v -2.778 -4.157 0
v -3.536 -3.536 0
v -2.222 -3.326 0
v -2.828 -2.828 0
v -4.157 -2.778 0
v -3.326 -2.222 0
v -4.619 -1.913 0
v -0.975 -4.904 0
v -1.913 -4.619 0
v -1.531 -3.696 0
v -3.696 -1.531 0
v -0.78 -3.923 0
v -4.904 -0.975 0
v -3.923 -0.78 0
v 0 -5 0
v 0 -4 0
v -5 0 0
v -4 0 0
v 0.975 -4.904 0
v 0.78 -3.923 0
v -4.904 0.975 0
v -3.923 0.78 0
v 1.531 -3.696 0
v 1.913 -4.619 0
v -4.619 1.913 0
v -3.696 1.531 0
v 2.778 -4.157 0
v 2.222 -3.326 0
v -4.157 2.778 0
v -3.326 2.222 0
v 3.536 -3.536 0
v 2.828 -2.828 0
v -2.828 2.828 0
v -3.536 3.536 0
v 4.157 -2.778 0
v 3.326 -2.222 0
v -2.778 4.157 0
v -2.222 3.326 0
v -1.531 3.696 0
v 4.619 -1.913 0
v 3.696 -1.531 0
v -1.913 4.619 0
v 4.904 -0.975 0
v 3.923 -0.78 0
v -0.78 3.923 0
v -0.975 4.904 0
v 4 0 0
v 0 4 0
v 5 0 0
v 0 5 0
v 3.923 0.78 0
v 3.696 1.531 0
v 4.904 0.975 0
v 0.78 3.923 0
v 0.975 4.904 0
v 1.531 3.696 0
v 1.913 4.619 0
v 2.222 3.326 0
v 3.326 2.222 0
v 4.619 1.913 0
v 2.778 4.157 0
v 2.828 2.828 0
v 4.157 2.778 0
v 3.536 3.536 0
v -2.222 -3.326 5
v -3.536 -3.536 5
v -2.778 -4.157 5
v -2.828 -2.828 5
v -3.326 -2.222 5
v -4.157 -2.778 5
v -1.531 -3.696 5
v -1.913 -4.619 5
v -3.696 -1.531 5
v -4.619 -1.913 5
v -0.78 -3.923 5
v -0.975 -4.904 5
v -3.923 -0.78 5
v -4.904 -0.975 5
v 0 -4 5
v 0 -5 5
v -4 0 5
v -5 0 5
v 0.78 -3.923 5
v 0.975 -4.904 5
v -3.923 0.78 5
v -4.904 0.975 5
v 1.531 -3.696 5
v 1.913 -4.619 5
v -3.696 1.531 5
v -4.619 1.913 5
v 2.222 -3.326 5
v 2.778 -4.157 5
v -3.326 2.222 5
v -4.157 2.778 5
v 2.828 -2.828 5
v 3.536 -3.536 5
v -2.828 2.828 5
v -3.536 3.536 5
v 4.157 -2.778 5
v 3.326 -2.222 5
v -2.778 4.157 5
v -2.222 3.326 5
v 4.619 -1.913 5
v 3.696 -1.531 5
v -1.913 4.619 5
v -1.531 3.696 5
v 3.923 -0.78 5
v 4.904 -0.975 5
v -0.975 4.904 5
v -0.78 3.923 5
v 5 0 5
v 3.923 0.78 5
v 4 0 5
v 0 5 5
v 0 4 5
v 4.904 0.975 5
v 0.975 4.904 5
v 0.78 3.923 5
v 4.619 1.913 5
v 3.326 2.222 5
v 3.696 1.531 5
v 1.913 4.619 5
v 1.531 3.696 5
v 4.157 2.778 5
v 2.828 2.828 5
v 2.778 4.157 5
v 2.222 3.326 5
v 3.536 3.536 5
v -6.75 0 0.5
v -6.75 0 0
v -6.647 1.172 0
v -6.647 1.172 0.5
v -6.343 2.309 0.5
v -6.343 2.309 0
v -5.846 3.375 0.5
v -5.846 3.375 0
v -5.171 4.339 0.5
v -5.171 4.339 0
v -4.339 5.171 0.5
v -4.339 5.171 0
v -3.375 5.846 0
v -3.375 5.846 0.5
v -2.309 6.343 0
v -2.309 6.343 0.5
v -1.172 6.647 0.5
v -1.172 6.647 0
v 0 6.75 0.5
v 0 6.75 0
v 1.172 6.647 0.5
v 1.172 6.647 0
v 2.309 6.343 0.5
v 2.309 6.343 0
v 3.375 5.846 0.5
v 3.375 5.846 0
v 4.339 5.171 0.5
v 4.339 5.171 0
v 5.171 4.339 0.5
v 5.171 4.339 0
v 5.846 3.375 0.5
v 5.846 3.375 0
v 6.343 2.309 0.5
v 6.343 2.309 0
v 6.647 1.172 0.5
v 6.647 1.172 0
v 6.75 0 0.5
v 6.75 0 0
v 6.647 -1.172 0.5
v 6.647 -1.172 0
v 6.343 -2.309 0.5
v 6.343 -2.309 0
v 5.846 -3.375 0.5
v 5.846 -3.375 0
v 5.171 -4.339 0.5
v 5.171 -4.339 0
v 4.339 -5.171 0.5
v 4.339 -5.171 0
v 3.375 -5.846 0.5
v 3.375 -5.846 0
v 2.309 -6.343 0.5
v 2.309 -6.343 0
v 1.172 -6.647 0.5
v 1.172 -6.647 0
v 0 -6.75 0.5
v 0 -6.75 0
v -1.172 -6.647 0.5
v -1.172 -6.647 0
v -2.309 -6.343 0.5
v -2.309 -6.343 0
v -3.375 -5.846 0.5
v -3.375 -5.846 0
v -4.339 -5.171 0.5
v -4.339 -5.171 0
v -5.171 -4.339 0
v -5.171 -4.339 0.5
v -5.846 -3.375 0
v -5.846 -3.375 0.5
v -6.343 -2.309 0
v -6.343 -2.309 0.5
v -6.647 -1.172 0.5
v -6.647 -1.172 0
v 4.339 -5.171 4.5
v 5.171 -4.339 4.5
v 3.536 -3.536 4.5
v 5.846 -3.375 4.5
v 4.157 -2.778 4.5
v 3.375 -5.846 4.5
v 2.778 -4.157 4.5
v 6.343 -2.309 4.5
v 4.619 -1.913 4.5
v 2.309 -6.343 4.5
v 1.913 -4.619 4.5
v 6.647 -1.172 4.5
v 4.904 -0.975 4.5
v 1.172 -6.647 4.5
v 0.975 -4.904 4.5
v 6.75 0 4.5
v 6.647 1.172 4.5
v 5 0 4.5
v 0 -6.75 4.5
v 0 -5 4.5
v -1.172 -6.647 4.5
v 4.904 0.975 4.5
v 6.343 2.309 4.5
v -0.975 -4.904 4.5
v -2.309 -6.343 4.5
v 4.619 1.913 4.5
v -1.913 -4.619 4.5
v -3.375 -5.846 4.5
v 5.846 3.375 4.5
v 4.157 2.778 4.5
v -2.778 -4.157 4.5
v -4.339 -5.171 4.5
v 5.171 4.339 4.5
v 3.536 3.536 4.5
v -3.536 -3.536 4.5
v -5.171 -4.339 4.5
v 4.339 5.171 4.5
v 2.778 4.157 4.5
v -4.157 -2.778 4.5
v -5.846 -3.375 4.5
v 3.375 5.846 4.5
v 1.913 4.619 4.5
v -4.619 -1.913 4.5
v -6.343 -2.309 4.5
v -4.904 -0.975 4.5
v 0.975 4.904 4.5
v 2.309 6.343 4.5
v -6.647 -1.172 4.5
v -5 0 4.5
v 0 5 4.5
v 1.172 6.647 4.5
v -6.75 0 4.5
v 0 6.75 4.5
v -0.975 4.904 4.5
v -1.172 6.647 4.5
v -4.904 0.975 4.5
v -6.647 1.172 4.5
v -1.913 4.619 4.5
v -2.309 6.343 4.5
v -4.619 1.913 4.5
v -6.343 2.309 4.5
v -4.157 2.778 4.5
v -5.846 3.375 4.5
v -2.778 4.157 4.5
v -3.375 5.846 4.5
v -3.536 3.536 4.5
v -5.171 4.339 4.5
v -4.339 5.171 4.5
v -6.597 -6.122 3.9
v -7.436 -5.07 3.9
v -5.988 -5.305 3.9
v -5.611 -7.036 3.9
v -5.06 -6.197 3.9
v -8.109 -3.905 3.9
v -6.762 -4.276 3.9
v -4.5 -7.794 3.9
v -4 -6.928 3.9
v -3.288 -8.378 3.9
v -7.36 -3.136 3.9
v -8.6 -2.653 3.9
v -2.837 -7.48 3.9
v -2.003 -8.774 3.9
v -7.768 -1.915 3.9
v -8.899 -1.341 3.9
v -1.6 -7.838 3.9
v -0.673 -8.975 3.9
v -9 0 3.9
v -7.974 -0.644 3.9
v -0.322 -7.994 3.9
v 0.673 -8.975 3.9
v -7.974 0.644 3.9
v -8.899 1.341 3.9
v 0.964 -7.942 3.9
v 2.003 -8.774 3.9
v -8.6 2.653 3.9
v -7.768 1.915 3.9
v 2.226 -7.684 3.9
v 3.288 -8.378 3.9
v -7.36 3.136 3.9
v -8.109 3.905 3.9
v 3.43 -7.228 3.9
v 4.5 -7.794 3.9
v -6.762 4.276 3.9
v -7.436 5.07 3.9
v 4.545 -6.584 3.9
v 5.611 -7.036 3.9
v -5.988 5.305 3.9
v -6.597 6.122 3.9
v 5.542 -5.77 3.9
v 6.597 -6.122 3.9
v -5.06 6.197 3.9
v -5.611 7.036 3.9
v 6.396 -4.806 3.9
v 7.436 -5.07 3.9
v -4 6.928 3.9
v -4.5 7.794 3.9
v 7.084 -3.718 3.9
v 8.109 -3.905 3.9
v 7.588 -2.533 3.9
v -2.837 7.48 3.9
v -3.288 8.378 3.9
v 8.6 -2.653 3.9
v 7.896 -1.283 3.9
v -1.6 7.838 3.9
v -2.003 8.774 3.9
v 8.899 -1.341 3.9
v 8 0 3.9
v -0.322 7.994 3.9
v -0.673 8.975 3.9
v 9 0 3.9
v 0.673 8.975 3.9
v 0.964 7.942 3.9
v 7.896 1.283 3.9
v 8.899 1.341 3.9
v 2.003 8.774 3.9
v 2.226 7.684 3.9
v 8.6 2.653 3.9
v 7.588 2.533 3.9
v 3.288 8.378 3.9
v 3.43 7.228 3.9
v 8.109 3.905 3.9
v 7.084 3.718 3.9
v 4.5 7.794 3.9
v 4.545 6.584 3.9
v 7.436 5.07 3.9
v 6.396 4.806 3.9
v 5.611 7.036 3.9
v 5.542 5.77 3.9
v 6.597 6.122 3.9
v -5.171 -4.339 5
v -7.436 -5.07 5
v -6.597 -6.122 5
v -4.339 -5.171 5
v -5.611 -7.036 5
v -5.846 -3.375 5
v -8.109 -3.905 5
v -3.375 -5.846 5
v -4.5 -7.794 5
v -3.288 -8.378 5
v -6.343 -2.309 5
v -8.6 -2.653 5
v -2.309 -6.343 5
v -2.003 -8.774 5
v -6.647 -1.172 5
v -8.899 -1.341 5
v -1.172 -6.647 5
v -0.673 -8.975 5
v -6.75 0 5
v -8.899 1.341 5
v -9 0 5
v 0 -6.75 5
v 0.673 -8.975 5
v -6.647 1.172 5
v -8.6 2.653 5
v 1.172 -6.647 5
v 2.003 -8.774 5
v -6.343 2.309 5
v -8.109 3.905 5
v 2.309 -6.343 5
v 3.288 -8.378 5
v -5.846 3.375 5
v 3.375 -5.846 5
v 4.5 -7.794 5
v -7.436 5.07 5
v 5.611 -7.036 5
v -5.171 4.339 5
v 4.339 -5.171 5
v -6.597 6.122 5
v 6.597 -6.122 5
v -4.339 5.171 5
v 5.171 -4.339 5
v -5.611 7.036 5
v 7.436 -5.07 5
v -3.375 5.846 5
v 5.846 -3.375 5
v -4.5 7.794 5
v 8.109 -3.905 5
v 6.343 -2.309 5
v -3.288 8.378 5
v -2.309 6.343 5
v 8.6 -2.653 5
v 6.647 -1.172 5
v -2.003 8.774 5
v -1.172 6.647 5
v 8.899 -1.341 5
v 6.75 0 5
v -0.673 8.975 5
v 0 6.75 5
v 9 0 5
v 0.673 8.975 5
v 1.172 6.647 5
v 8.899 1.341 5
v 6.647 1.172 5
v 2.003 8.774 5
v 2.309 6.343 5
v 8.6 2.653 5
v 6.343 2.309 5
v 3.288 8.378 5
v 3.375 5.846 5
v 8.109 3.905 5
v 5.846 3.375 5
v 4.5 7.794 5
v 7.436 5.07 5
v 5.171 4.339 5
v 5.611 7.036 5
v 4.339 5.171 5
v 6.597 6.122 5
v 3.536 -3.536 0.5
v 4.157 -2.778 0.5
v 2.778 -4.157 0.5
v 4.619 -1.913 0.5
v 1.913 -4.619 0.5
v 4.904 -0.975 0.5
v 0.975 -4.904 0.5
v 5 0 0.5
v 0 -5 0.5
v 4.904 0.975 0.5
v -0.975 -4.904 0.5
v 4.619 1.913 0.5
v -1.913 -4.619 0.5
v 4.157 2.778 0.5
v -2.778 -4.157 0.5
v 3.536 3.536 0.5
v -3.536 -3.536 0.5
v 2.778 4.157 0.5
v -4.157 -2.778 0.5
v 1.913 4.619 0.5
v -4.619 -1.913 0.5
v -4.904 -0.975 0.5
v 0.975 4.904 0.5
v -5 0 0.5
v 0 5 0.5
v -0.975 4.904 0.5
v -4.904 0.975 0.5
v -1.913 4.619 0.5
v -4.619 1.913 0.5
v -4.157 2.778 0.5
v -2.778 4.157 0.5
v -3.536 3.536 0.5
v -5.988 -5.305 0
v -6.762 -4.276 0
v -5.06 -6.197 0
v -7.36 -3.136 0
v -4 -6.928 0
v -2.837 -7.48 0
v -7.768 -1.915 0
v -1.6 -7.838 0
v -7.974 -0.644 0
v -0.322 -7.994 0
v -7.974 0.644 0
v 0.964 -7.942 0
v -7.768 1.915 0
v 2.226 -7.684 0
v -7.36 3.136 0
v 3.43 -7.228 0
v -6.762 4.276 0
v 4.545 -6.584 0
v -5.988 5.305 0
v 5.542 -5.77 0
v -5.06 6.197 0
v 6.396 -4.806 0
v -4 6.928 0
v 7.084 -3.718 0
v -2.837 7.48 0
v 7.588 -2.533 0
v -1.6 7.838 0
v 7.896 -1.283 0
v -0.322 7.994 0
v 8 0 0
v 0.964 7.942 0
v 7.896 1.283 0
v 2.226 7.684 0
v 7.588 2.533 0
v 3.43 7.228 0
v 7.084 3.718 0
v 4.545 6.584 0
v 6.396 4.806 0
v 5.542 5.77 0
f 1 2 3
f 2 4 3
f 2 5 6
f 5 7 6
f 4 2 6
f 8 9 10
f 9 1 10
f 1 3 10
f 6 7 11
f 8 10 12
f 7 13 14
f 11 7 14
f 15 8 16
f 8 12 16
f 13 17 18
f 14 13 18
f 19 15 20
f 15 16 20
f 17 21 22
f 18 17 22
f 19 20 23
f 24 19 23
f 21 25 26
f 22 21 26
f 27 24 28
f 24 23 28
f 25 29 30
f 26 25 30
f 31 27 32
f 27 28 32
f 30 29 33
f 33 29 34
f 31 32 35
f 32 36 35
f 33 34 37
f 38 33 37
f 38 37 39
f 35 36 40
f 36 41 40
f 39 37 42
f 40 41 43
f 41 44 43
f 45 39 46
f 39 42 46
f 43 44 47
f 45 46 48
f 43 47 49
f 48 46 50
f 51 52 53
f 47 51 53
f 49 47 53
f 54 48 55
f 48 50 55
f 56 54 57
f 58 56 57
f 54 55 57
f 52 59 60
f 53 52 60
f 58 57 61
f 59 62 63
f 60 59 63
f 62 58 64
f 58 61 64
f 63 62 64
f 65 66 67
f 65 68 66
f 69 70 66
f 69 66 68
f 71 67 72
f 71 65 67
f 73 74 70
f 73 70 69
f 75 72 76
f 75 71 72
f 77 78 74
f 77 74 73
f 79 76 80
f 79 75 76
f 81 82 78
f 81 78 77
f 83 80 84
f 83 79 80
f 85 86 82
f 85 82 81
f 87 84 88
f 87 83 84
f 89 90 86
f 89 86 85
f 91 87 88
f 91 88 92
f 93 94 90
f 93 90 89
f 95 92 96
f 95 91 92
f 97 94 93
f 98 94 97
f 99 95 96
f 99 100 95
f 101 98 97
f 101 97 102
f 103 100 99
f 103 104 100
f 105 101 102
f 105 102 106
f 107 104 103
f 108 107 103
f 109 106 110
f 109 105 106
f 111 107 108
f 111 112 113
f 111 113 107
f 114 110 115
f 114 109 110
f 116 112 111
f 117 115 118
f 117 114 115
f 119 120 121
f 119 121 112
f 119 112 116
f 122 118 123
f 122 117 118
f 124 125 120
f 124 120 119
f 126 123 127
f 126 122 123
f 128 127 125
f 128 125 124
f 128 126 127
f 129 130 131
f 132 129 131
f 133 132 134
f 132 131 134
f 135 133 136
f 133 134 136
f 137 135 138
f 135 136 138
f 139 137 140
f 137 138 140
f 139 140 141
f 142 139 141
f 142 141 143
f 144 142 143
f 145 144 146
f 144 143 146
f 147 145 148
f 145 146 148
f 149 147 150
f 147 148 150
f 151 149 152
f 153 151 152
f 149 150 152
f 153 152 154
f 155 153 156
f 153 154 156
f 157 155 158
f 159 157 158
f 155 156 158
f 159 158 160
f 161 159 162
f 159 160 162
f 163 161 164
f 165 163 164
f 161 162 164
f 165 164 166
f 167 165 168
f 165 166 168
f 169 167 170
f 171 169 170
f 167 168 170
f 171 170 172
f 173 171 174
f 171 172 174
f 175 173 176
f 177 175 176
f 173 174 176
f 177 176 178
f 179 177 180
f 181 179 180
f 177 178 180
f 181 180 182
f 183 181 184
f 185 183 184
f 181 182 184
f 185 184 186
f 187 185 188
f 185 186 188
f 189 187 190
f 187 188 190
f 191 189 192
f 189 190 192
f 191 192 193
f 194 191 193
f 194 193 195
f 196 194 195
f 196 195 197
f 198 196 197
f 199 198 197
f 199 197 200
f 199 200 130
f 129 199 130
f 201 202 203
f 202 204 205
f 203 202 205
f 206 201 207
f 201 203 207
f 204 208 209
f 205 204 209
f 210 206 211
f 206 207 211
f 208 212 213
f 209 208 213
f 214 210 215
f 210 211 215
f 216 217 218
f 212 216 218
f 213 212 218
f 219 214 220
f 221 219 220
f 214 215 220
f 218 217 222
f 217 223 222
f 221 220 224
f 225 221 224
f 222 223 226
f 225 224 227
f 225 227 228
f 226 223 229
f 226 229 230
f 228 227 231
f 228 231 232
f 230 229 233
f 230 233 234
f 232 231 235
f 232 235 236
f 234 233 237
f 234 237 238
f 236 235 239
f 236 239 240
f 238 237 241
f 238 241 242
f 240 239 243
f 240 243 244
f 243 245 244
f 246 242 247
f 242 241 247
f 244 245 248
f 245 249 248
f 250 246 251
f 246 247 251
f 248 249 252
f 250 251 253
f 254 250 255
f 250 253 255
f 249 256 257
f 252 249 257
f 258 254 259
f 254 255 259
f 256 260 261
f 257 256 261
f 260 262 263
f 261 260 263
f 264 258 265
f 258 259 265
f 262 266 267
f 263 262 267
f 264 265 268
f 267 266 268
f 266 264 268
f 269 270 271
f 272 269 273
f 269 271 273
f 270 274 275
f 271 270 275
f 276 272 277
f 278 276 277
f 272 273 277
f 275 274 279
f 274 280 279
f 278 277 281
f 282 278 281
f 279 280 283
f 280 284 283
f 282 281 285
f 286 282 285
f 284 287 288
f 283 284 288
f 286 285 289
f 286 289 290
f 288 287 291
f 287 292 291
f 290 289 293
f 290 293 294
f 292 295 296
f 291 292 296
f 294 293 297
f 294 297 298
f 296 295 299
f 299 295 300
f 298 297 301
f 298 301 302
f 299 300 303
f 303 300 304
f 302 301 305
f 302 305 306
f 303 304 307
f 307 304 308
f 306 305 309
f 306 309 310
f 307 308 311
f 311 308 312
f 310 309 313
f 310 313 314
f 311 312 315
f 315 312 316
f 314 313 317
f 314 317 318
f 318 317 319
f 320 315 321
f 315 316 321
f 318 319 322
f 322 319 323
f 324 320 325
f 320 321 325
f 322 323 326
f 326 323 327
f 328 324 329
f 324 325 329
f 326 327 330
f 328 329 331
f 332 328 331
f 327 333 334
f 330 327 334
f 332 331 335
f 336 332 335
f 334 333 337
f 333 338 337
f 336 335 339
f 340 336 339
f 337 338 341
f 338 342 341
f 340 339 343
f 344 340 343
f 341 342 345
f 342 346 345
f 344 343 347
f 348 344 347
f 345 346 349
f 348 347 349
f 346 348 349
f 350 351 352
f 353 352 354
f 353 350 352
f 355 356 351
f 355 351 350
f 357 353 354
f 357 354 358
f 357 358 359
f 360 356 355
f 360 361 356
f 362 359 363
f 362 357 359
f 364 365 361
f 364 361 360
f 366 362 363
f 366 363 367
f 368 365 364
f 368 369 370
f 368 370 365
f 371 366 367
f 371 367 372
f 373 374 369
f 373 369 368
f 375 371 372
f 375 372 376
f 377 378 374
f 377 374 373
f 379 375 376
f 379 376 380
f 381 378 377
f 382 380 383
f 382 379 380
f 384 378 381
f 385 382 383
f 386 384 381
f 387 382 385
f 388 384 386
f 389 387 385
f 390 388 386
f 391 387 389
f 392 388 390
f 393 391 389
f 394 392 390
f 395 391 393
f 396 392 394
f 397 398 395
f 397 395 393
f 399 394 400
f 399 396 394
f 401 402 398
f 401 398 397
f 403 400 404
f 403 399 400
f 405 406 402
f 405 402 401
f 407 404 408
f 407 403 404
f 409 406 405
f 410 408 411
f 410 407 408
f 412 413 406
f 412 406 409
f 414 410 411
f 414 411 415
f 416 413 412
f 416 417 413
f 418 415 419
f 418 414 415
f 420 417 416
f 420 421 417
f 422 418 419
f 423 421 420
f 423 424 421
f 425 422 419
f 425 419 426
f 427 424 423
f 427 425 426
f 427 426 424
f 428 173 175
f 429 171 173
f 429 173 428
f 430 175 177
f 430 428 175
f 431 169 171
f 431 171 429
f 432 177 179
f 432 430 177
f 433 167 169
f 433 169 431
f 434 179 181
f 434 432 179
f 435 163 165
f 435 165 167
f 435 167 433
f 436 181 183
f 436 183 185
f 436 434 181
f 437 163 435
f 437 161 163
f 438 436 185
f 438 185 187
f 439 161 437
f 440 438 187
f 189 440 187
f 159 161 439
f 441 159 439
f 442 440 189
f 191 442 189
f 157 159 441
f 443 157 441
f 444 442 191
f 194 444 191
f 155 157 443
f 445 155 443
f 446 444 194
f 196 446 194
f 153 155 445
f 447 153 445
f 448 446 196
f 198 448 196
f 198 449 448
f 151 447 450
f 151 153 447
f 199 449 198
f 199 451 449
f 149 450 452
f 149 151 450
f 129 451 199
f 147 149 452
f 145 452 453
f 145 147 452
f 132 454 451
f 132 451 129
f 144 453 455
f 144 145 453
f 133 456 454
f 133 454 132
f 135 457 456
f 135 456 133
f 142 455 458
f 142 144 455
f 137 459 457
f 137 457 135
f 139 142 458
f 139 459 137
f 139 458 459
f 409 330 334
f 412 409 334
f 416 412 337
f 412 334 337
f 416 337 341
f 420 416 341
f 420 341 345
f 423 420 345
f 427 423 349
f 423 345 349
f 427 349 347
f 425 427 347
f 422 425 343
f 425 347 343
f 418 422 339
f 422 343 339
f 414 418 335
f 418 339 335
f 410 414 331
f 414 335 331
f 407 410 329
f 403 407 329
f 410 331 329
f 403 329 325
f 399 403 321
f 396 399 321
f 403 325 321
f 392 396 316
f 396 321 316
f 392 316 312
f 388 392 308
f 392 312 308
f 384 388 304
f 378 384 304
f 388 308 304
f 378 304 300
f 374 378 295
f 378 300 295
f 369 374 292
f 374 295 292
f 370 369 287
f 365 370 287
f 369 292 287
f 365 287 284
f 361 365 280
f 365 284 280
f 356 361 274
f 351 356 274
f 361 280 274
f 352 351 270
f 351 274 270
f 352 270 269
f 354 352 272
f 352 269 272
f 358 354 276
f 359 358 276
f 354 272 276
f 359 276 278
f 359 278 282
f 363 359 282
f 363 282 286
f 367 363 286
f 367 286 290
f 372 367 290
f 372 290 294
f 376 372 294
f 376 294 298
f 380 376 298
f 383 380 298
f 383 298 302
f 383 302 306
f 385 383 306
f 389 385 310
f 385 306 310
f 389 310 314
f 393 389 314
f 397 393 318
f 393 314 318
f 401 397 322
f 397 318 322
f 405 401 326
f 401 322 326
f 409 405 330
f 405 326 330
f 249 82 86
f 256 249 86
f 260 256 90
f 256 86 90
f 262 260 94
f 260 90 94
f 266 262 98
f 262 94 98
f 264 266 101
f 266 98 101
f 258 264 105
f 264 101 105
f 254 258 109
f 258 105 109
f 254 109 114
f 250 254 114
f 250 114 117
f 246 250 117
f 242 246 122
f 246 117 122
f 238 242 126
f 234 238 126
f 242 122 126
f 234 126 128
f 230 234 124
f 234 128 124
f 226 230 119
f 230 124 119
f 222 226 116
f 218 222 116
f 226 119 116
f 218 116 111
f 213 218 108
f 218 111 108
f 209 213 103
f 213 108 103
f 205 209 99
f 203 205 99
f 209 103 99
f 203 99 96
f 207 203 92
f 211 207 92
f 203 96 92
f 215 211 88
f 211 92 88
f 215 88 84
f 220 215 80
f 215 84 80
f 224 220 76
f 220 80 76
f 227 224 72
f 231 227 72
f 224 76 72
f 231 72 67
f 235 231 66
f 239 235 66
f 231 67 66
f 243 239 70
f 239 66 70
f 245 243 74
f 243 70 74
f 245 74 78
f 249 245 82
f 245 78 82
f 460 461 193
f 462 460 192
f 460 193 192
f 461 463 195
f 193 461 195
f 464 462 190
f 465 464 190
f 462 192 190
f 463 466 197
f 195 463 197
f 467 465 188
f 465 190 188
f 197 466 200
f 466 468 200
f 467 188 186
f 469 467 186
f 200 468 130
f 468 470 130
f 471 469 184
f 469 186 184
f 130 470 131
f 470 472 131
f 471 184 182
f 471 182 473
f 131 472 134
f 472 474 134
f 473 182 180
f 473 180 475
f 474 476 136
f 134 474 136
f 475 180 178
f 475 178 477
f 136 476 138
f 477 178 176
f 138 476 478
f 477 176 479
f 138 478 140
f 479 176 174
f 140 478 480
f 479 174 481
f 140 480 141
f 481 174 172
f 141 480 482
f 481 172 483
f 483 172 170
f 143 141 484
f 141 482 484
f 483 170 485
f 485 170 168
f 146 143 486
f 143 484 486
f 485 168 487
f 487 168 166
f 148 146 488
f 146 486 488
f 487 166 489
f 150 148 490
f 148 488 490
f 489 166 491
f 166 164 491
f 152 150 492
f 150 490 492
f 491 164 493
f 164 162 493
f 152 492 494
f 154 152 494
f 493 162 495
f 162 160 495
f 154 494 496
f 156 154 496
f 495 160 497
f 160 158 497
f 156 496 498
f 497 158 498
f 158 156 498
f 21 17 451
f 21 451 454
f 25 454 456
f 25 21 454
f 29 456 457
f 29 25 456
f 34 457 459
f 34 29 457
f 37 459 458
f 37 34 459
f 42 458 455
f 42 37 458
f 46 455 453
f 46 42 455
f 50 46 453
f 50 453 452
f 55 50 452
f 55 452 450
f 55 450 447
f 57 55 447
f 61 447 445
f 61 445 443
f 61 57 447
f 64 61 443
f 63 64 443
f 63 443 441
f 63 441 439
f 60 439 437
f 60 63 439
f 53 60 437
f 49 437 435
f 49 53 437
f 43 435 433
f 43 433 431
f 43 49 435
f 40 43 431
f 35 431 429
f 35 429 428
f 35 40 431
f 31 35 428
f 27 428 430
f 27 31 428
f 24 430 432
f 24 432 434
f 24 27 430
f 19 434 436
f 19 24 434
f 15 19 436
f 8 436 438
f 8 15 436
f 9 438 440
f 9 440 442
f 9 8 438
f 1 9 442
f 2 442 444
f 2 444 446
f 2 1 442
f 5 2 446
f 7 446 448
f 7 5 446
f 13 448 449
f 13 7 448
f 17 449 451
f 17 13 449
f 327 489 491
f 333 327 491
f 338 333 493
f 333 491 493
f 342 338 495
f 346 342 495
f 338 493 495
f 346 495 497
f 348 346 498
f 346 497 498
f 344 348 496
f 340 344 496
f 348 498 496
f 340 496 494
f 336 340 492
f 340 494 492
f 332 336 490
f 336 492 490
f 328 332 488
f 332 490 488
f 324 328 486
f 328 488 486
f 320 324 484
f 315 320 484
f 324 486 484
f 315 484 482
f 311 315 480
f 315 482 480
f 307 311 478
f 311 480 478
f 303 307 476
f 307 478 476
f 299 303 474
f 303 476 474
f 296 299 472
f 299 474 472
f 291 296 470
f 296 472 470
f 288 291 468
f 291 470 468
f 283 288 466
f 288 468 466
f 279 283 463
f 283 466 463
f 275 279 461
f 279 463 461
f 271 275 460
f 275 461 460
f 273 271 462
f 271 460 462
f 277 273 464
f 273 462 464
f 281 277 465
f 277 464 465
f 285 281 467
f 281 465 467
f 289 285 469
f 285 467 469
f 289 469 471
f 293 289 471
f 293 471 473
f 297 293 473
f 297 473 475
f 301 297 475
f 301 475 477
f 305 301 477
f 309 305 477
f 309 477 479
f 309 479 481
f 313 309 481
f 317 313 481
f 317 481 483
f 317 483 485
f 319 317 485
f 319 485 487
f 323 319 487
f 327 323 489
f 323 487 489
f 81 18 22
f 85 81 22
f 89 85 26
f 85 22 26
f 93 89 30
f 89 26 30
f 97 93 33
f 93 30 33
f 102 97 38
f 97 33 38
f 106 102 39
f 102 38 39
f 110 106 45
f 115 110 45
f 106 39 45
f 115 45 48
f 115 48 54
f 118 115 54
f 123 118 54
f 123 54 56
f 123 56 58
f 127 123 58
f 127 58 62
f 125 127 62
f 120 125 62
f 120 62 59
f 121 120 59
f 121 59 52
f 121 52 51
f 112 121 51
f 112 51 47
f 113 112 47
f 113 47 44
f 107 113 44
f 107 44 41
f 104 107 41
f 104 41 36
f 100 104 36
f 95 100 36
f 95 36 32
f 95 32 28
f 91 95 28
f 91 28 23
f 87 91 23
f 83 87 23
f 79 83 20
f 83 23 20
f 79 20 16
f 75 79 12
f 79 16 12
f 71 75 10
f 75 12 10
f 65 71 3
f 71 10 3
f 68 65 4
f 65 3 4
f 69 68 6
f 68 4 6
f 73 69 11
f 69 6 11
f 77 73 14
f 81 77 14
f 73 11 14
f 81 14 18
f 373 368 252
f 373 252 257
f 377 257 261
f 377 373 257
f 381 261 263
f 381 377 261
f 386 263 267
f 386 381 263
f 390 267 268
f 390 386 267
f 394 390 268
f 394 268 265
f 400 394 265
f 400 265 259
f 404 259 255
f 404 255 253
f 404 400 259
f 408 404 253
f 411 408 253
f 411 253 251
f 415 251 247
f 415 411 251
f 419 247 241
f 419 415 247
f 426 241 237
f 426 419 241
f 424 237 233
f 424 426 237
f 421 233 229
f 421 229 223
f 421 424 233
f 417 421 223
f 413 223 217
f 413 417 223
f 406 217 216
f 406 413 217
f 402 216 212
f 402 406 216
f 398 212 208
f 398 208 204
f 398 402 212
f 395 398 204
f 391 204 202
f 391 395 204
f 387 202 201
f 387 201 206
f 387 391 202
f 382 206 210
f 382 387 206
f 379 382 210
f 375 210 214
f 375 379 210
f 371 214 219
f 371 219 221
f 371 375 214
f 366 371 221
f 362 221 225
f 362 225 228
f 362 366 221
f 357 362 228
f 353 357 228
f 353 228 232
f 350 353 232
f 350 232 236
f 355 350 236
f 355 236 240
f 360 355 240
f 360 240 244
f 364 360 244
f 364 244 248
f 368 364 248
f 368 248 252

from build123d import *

# Parameters (mm, degrees)
SKETCH1_R           = 8
BOSS_EXTRUDE1_DEPTH = 3.9
SKETCH2_R           = 9
BOSS_EXTRUDE2_DEPTH = 1.1
SKETCH3_R           = 6.75
SKETCH3_R_2         = 5
CUT_EXTRUDE1_DEPTH  = 0.5
SKETCH3_3_R         = 4
CUT_EXTRUDE2_DEPTH  = 14.674794331


with BuildPart() as part:
    # Sketch1 → Boss-Extrude1 (new body)
    with BuildSketch(Plane.XY):
        Circle(SKETCH1_R)
    extrude(amount=BOSS_EXTRUDE1_DEPTH)

    # Sketch2 → Boss-Extrude2 (add)
    with BuildSketch(Plane.XY.offset(3.9)):
        Circle(SKETCH2_R)
    extrude(amount=BOSS_EXTRUDE2_DEPTH)

    # Sketch3 → Cut-Extrude1 (cut)
    with BuildSketch(Plane(origin=(0, 0, 0), x_dir=(-1, 0, 0), z_dir=(0, 0, -1))):
        Circle(SKETCH3_R)
        Circle(SKETCH3_R_2, mode=Mode.SUBTRACT)
    cut_extrude1 = extrude(amount=-CUT_EXTRUDE1_DEPTH, mode=Mode.SUBTRACT)

    # Sketch3<3> → Cut-Extrude2 (cut, through all)
    with BuildSketch(Plane(origin=(0, 0, 0), x_dir=(-1, 0, 0), z_dir=(0, 0, -1))):
        Circle(SKETCH3_3_R)
    extrude(amount=-CUT_EXTRUDE2_DEPTH, mode=Mode.SUBTRACT)

    # Mirror1: Cut-Extrude1 across plane
    add(cut_extrude1.mirror(Plane(origin=(0, 0, 2.5), x_dir=(1, 0, 0), z_dir=(0, 0, -1))), mode=Mode.SUBTRACT)


solid = part.part
